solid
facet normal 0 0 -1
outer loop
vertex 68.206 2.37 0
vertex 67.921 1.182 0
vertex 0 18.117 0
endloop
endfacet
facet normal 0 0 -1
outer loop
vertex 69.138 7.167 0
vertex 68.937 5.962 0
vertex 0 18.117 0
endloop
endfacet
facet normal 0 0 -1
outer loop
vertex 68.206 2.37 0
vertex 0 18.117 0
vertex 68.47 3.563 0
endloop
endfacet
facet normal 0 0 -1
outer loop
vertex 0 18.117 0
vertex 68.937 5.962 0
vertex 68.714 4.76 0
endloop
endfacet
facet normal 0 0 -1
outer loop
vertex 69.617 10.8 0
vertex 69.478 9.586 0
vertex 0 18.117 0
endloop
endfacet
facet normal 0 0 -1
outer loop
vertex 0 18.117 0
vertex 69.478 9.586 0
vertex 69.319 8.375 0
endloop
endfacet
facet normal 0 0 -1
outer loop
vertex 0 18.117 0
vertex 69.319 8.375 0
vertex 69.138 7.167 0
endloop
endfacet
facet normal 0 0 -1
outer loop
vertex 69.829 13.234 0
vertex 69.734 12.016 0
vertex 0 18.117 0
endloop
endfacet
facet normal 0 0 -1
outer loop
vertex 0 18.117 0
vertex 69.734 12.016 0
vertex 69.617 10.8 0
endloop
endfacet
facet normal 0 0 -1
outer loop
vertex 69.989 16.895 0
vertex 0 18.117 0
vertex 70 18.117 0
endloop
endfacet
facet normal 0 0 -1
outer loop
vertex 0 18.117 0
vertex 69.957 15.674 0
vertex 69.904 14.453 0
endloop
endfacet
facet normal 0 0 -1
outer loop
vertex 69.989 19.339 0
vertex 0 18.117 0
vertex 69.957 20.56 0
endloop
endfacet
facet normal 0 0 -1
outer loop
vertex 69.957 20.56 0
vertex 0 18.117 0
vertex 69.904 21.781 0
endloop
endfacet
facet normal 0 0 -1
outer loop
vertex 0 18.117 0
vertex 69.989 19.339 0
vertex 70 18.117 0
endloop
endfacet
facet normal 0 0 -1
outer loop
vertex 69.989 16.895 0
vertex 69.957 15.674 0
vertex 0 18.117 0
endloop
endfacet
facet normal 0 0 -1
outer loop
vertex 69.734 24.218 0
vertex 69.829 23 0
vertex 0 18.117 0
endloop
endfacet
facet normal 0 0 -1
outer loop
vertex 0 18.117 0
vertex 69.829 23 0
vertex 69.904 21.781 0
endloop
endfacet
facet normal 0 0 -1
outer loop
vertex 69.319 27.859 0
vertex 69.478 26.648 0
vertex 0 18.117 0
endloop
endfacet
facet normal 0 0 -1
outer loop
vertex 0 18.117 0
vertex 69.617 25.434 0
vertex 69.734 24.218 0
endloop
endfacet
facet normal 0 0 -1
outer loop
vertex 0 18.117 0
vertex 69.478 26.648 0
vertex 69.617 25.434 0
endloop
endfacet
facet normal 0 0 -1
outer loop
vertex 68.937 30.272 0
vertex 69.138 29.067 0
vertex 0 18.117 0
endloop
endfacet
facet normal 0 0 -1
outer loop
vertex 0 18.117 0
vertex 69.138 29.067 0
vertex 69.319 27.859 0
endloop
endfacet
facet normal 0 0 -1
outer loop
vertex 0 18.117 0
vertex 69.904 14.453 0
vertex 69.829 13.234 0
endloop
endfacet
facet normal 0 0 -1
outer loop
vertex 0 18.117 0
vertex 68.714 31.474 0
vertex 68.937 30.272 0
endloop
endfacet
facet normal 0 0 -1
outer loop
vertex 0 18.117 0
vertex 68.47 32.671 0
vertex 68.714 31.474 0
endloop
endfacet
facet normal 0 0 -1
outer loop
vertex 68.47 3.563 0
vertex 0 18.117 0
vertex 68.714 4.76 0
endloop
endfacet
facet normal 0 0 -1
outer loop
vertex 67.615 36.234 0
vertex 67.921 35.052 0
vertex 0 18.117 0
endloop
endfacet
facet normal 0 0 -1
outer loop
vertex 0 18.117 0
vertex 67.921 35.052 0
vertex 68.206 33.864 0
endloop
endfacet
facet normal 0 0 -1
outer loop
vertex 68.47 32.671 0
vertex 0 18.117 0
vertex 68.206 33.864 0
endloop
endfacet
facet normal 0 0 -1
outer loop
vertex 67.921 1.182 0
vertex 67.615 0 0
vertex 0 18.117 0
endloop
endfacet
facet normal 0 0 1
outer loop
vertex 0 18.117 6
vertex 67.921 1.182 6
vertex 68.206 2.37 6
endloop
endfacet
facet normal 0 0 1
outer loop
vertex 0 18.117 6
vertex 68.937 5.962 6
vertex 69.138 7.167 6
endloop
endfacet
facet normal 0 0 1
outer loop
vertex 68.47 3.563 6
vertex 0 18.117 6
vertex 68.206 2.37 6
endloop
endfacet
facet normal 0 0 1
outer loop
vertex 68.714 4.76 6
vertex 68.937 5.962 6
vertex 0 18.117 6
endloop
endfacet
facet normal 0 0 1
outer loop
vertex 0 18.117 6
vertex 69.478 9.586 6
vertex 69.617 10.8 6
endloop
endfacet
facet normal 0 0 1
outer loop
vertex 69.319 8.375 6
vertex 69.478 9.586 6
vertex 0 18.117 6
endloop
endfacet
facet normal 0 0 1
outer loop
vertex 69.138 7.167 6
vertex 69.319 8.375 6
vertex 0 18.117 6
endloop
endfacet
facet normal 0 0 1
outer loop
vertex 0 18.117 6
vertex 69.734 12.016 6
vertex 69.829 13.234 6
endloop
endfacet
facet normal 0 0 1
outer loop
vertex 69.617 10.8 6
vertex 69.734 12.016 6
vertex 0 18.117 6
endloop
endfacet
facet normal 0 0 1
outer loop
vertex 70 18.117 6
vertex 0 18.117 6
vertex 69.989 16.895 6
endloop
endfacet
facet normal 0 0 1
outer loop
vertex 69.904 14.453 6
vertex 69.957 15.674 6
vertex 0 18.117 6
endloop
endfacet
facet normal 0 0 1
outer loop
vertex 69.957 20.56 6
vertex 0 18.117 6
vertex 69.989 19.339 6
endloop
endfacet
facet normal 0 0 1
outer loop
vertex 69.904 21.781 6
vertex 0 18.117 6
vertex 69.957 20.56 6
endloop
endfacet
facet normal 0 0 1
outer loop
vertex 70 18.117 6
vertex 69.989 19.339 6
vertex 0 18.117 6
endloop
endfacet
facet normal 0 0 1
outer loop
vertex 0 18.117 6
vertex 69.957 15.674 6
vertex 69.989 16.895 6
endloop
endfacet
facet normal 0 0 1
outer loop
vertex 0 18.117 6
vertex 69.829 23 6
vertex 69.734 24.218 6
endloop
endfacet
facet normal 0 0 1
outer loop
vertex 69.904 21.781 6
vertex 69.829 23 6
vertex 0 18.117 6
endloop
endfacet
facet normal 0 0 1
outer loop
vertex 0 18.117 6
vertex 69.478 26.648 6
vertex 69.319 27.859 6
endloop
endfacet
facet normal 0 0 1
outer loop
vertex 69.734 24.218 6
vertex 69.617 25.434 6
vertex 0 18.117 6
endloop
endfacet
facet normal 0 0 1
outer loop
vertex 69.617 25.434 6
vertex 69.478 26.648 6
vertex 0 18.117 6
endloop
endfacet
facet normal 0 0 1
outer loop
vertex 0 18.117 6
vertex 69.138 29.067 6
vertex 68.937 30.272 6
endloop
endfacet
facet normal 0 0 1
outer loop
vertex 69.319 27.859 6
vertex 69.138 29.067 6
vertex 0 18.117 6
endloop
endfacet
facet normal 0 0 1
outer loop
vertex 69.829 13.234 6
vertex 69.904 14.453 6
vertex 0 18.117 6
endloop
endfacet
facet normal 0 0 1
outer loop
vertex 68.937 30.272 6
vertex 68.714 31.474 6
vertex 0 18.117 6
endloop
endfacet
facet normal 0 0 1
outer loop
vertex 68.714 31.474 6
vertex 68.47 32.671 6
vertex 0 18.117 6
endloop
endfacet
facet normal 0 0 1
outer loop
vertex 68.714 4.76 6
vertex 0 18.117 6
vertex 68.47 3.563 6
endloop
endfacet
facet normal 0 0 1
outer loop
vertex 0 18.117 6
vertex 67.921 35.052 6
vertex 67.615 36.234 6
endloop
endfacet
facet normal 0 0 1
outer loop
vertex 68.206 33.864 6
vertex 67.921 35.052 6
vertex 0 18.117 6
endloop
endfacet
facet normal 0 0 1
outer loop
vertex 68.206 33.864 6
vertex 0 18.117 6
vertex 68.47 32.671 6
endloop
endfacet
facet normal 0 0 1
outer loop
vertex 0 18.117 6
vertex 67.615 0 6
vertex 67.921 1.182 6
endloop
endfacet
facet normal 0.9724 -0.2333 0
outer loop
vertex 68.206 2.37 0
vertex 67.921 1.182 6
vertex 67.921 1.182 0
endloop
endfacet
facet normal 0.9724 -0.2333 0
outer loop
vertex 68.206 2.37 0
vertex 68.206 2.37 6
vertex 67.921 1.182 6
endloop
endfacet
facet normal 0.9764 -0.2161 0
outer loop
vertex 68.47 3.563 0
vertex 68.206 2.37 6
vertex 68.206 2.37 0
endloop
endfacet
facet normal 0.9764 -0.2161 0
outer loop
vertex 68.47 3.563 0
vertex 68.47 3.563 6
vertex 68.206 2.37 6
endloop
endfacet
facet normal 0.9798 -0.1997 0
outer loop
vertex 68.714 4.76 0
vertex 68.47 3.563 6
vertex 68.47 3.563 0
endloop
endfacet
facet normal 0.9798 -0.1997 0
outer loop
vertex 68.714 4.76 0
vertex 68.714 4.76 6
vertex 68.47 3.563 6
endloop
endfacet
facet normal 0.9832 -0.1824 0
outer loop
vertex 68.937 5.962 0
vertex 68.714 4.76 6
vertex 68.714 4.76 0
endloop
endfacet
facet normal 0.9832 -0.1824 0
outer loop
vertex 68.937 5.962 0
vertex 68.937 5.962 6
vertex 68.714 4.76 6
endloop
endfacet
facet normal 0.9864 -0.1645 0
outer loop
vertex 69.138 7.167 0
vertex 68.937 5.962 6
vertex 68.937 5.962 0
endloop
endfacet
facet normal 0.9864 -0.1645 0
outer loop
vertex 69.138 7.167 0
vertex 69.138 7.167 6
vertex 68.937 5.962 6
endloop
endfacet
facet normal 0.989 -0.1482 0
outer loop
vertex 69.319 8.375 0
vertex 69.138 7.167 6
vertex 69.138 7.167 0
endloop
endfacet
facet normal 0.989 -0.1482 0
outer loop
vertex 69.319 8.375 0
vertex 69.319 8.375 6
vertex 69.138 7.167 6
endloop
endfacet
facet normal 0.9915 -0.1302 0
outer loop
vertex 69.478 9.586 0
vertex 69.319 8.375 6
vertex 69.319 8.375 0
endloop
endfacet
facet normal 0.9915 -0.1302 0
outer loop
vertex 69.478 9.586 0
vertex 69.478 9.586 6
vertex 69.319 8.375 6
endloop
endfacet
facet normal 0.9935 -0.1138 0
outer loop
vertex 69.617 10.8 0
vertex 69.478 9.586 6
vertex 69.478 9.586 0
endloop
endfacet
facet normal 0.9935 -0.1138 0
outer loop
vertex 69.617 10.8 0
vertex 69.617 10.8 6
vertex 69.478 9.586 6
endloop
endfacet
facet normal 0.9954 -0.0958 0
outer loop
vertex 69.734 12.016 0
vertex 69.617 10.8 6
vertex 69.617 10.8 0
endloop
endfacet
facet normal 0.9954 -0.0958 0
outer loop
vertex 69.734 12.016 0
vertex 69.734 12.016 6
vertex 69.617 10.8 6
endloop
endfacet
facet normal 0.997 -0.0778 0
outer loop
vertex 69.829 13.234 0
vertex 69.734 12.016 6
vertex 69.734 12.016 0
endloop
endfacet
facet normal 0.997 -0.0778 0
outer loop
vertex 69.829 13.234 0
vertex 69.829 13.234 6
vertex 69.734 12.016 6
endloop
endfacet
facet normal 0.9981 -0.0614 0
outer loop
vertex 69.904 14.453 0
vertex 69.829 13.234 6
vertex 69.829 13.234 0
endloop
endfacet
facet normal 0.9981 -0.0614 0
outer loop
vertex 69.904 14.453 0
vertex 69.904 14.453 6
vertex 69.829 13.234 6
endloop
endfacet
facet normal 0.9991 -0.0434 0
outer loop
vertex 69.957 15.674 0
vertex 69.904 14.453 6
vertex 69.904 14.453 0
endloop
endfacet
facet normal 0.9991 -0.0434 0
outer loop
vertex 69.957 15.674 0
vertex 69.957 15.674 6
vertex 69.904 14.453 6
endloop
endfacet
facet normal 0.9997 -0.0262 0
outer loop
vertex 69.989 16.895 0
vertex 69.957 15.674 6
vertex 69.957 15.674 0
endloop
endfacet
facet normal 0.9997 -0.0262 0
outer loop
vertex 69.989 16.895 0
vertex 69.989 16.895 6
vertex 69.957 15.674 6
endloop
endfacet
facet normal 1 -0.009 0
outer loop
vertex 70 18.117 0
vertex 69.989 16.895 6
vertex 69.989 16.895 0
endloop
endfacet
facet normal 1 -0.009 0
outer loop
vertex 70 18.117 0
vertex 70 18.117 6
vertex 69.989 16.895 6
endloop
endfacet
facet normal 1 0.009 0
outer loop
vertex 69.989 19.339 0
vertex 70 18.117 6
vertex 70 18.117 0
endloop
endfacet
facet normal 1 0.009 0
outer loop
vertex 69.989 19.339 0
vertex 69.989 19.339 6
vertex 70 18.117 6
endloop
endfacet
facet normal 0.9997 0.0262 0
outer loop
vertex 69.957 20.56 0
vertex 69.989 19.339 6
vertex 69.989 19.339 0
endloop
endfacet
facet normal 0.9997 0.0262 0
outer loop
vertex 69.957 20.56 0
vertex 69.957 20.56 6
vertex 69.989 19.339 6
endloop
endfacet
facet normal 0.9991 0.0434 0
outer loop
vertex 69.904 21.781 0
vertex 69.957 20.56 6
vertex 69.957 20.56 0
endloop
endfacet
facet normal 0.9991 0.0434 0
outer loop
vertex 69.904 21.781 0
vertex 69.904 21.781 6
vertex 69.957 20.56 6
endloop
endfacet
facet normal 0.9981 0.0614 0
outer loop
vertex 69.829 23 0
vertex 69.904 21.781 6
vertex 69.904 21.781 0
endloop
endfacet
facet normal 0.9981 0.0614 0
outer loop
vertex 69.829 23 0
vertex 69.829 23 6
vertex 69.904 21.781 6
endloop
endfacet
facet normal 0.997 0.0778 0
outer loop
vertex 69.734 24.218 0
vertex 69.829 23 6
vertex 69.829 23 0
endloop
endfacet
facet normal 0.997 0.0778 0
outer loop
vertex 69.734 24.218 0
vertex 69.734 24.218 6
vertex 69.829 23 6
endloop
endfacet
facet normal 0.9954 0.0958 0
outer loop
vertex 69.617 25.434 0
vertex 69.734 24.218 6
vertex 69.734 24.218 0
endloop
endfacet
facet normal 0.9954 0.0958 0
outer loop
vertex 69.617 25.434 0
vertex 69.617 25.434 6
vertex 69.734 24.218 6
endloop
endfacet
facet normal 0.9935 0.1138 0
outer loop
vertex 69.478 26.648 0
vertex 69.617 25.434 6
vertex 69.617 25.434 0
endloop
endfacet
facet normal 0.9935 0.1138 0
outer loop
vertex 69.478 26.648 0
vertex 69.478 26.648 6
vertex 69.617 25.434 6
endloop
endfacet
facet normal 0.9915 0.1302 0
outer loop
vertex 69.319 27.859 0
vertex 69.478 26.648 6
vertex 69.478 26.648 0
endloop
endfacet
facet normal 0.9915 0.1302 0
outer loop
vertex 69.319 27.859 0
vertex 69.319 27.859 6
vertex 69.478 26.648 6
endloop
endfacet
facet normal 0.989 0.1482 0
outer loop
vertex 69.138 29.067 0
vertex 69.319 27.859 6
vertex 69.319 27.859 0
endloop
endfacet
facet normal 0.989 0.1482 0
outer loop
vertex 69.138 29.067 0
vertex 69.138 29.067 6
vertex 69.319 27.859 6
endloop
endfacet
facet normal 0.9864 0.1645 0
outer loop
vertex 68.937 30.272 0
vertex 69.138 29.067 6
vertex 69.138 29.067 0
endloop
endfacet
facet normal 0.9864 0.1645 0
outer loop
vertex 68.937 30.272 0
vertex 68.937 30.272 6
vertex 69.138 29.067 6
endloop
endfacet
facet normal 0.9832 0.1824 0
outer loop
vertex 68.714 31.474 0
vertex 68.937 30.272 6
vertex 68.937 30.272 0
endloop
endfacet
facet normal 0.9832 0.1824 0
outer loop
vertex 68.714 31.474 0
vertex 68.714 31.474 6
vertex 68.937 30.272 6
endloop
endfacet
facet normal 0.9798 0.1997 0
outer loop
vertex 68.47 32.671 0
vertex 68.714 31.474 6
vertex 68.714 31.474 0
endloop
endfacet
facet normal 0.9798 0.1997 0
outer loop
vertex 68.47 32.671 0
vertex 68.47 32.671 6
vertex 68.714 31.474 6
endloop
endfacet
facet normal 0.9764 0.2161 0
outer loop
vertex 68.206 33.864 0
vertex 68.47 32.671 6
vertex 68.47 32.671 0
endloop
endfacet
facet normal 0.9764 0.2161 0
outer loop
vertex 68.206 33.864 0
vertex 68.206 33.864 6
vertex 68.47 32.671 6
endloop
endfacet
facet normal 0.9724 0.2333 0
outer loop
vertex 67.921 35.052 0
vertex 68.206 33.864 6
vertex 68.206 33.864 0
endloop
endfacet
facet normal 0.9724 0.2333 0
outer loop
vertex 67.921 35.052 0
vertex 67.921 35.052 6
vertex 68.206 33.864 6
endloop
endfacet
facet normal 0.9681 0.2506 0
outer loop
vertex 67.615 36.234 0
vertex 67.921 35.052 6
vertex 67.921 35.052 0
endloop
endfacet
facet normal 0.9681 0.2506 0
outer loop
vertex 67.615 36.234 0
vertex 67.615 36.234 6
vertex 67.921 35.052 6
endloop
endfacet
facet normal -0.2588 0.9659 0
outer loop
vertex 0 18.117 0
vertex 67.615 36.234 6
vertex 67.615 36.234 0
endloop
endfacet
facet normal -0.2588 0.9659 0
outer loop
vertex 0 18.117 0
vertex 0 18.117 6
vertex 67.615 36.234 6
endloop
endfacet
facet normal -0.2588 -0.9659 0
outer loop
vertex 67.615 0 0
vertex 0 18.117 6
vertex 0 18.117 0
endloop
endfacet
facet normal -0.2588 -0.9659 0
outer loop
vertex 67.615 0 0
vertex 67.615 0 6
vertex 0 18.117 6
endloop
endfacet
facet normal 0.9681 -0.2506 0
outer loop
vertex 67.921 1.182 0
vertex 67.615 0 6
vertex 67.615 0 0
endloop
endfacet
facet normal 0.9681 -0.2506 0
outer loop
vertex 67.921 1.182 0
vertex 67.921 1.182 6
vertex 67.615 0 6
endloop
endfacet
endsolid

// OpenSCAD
$fn = 32;

// ----------------------------------------------------------------------
// Arc profile plate: sector, 32 points
// ----------------------------------------------------------------------

// --- parameters (mm) ---
sector_angle = 30;        // sector angle, degrees
sector_r = 70;            // outer radius
arc_step = 1;             // sampling step of the arc, degrees
plate_t = 6;              // plate thickness, Z
fit_tol = 0.05;           // declared fit tolerance (prompt contract)
free_tol = 0.2;           // declared free tolerance (prompt contract)

bbox_x = 2 * sector_r * sin(sector_angle / 2);  // chord of the sector
bbox_y = sector_r;  // depth of the sector (apex to arc)

profile = [[67.615, 0], [67.921, 1.182], [68.206, 2.37], [68.47, 3.563], [68.714, 4.76], [68.937, 5.962], [69.138, 7.167], [69.319, 8.375], [69.478, 9.586], [69.617, 10.8], [69.734, 12.016], [69.829, 13.234], [69.904, 14.453], [69.957, 15.674], [69.989, 16.895], [70, 18.117], [69.989, 19.339], [69.957, 20.56], [69.904, 21.781], [69.829, 23], [69.734, 24.218], [69.617, 25.434], [69.478, 26.648], [69.319, 27.859], [69.138, 29.067], [68.937, 30.272], [68.714, 31.474], [68.47, 32.671], [68.206, 33.864], [67.921, 35.052], [67.615, 36.234], [0, 18.117]];  // primary outline, 32 points, counter clockwise

// --- the one profile operation ---
linear_extrude(height = plate_t) polygon(points = profile);
